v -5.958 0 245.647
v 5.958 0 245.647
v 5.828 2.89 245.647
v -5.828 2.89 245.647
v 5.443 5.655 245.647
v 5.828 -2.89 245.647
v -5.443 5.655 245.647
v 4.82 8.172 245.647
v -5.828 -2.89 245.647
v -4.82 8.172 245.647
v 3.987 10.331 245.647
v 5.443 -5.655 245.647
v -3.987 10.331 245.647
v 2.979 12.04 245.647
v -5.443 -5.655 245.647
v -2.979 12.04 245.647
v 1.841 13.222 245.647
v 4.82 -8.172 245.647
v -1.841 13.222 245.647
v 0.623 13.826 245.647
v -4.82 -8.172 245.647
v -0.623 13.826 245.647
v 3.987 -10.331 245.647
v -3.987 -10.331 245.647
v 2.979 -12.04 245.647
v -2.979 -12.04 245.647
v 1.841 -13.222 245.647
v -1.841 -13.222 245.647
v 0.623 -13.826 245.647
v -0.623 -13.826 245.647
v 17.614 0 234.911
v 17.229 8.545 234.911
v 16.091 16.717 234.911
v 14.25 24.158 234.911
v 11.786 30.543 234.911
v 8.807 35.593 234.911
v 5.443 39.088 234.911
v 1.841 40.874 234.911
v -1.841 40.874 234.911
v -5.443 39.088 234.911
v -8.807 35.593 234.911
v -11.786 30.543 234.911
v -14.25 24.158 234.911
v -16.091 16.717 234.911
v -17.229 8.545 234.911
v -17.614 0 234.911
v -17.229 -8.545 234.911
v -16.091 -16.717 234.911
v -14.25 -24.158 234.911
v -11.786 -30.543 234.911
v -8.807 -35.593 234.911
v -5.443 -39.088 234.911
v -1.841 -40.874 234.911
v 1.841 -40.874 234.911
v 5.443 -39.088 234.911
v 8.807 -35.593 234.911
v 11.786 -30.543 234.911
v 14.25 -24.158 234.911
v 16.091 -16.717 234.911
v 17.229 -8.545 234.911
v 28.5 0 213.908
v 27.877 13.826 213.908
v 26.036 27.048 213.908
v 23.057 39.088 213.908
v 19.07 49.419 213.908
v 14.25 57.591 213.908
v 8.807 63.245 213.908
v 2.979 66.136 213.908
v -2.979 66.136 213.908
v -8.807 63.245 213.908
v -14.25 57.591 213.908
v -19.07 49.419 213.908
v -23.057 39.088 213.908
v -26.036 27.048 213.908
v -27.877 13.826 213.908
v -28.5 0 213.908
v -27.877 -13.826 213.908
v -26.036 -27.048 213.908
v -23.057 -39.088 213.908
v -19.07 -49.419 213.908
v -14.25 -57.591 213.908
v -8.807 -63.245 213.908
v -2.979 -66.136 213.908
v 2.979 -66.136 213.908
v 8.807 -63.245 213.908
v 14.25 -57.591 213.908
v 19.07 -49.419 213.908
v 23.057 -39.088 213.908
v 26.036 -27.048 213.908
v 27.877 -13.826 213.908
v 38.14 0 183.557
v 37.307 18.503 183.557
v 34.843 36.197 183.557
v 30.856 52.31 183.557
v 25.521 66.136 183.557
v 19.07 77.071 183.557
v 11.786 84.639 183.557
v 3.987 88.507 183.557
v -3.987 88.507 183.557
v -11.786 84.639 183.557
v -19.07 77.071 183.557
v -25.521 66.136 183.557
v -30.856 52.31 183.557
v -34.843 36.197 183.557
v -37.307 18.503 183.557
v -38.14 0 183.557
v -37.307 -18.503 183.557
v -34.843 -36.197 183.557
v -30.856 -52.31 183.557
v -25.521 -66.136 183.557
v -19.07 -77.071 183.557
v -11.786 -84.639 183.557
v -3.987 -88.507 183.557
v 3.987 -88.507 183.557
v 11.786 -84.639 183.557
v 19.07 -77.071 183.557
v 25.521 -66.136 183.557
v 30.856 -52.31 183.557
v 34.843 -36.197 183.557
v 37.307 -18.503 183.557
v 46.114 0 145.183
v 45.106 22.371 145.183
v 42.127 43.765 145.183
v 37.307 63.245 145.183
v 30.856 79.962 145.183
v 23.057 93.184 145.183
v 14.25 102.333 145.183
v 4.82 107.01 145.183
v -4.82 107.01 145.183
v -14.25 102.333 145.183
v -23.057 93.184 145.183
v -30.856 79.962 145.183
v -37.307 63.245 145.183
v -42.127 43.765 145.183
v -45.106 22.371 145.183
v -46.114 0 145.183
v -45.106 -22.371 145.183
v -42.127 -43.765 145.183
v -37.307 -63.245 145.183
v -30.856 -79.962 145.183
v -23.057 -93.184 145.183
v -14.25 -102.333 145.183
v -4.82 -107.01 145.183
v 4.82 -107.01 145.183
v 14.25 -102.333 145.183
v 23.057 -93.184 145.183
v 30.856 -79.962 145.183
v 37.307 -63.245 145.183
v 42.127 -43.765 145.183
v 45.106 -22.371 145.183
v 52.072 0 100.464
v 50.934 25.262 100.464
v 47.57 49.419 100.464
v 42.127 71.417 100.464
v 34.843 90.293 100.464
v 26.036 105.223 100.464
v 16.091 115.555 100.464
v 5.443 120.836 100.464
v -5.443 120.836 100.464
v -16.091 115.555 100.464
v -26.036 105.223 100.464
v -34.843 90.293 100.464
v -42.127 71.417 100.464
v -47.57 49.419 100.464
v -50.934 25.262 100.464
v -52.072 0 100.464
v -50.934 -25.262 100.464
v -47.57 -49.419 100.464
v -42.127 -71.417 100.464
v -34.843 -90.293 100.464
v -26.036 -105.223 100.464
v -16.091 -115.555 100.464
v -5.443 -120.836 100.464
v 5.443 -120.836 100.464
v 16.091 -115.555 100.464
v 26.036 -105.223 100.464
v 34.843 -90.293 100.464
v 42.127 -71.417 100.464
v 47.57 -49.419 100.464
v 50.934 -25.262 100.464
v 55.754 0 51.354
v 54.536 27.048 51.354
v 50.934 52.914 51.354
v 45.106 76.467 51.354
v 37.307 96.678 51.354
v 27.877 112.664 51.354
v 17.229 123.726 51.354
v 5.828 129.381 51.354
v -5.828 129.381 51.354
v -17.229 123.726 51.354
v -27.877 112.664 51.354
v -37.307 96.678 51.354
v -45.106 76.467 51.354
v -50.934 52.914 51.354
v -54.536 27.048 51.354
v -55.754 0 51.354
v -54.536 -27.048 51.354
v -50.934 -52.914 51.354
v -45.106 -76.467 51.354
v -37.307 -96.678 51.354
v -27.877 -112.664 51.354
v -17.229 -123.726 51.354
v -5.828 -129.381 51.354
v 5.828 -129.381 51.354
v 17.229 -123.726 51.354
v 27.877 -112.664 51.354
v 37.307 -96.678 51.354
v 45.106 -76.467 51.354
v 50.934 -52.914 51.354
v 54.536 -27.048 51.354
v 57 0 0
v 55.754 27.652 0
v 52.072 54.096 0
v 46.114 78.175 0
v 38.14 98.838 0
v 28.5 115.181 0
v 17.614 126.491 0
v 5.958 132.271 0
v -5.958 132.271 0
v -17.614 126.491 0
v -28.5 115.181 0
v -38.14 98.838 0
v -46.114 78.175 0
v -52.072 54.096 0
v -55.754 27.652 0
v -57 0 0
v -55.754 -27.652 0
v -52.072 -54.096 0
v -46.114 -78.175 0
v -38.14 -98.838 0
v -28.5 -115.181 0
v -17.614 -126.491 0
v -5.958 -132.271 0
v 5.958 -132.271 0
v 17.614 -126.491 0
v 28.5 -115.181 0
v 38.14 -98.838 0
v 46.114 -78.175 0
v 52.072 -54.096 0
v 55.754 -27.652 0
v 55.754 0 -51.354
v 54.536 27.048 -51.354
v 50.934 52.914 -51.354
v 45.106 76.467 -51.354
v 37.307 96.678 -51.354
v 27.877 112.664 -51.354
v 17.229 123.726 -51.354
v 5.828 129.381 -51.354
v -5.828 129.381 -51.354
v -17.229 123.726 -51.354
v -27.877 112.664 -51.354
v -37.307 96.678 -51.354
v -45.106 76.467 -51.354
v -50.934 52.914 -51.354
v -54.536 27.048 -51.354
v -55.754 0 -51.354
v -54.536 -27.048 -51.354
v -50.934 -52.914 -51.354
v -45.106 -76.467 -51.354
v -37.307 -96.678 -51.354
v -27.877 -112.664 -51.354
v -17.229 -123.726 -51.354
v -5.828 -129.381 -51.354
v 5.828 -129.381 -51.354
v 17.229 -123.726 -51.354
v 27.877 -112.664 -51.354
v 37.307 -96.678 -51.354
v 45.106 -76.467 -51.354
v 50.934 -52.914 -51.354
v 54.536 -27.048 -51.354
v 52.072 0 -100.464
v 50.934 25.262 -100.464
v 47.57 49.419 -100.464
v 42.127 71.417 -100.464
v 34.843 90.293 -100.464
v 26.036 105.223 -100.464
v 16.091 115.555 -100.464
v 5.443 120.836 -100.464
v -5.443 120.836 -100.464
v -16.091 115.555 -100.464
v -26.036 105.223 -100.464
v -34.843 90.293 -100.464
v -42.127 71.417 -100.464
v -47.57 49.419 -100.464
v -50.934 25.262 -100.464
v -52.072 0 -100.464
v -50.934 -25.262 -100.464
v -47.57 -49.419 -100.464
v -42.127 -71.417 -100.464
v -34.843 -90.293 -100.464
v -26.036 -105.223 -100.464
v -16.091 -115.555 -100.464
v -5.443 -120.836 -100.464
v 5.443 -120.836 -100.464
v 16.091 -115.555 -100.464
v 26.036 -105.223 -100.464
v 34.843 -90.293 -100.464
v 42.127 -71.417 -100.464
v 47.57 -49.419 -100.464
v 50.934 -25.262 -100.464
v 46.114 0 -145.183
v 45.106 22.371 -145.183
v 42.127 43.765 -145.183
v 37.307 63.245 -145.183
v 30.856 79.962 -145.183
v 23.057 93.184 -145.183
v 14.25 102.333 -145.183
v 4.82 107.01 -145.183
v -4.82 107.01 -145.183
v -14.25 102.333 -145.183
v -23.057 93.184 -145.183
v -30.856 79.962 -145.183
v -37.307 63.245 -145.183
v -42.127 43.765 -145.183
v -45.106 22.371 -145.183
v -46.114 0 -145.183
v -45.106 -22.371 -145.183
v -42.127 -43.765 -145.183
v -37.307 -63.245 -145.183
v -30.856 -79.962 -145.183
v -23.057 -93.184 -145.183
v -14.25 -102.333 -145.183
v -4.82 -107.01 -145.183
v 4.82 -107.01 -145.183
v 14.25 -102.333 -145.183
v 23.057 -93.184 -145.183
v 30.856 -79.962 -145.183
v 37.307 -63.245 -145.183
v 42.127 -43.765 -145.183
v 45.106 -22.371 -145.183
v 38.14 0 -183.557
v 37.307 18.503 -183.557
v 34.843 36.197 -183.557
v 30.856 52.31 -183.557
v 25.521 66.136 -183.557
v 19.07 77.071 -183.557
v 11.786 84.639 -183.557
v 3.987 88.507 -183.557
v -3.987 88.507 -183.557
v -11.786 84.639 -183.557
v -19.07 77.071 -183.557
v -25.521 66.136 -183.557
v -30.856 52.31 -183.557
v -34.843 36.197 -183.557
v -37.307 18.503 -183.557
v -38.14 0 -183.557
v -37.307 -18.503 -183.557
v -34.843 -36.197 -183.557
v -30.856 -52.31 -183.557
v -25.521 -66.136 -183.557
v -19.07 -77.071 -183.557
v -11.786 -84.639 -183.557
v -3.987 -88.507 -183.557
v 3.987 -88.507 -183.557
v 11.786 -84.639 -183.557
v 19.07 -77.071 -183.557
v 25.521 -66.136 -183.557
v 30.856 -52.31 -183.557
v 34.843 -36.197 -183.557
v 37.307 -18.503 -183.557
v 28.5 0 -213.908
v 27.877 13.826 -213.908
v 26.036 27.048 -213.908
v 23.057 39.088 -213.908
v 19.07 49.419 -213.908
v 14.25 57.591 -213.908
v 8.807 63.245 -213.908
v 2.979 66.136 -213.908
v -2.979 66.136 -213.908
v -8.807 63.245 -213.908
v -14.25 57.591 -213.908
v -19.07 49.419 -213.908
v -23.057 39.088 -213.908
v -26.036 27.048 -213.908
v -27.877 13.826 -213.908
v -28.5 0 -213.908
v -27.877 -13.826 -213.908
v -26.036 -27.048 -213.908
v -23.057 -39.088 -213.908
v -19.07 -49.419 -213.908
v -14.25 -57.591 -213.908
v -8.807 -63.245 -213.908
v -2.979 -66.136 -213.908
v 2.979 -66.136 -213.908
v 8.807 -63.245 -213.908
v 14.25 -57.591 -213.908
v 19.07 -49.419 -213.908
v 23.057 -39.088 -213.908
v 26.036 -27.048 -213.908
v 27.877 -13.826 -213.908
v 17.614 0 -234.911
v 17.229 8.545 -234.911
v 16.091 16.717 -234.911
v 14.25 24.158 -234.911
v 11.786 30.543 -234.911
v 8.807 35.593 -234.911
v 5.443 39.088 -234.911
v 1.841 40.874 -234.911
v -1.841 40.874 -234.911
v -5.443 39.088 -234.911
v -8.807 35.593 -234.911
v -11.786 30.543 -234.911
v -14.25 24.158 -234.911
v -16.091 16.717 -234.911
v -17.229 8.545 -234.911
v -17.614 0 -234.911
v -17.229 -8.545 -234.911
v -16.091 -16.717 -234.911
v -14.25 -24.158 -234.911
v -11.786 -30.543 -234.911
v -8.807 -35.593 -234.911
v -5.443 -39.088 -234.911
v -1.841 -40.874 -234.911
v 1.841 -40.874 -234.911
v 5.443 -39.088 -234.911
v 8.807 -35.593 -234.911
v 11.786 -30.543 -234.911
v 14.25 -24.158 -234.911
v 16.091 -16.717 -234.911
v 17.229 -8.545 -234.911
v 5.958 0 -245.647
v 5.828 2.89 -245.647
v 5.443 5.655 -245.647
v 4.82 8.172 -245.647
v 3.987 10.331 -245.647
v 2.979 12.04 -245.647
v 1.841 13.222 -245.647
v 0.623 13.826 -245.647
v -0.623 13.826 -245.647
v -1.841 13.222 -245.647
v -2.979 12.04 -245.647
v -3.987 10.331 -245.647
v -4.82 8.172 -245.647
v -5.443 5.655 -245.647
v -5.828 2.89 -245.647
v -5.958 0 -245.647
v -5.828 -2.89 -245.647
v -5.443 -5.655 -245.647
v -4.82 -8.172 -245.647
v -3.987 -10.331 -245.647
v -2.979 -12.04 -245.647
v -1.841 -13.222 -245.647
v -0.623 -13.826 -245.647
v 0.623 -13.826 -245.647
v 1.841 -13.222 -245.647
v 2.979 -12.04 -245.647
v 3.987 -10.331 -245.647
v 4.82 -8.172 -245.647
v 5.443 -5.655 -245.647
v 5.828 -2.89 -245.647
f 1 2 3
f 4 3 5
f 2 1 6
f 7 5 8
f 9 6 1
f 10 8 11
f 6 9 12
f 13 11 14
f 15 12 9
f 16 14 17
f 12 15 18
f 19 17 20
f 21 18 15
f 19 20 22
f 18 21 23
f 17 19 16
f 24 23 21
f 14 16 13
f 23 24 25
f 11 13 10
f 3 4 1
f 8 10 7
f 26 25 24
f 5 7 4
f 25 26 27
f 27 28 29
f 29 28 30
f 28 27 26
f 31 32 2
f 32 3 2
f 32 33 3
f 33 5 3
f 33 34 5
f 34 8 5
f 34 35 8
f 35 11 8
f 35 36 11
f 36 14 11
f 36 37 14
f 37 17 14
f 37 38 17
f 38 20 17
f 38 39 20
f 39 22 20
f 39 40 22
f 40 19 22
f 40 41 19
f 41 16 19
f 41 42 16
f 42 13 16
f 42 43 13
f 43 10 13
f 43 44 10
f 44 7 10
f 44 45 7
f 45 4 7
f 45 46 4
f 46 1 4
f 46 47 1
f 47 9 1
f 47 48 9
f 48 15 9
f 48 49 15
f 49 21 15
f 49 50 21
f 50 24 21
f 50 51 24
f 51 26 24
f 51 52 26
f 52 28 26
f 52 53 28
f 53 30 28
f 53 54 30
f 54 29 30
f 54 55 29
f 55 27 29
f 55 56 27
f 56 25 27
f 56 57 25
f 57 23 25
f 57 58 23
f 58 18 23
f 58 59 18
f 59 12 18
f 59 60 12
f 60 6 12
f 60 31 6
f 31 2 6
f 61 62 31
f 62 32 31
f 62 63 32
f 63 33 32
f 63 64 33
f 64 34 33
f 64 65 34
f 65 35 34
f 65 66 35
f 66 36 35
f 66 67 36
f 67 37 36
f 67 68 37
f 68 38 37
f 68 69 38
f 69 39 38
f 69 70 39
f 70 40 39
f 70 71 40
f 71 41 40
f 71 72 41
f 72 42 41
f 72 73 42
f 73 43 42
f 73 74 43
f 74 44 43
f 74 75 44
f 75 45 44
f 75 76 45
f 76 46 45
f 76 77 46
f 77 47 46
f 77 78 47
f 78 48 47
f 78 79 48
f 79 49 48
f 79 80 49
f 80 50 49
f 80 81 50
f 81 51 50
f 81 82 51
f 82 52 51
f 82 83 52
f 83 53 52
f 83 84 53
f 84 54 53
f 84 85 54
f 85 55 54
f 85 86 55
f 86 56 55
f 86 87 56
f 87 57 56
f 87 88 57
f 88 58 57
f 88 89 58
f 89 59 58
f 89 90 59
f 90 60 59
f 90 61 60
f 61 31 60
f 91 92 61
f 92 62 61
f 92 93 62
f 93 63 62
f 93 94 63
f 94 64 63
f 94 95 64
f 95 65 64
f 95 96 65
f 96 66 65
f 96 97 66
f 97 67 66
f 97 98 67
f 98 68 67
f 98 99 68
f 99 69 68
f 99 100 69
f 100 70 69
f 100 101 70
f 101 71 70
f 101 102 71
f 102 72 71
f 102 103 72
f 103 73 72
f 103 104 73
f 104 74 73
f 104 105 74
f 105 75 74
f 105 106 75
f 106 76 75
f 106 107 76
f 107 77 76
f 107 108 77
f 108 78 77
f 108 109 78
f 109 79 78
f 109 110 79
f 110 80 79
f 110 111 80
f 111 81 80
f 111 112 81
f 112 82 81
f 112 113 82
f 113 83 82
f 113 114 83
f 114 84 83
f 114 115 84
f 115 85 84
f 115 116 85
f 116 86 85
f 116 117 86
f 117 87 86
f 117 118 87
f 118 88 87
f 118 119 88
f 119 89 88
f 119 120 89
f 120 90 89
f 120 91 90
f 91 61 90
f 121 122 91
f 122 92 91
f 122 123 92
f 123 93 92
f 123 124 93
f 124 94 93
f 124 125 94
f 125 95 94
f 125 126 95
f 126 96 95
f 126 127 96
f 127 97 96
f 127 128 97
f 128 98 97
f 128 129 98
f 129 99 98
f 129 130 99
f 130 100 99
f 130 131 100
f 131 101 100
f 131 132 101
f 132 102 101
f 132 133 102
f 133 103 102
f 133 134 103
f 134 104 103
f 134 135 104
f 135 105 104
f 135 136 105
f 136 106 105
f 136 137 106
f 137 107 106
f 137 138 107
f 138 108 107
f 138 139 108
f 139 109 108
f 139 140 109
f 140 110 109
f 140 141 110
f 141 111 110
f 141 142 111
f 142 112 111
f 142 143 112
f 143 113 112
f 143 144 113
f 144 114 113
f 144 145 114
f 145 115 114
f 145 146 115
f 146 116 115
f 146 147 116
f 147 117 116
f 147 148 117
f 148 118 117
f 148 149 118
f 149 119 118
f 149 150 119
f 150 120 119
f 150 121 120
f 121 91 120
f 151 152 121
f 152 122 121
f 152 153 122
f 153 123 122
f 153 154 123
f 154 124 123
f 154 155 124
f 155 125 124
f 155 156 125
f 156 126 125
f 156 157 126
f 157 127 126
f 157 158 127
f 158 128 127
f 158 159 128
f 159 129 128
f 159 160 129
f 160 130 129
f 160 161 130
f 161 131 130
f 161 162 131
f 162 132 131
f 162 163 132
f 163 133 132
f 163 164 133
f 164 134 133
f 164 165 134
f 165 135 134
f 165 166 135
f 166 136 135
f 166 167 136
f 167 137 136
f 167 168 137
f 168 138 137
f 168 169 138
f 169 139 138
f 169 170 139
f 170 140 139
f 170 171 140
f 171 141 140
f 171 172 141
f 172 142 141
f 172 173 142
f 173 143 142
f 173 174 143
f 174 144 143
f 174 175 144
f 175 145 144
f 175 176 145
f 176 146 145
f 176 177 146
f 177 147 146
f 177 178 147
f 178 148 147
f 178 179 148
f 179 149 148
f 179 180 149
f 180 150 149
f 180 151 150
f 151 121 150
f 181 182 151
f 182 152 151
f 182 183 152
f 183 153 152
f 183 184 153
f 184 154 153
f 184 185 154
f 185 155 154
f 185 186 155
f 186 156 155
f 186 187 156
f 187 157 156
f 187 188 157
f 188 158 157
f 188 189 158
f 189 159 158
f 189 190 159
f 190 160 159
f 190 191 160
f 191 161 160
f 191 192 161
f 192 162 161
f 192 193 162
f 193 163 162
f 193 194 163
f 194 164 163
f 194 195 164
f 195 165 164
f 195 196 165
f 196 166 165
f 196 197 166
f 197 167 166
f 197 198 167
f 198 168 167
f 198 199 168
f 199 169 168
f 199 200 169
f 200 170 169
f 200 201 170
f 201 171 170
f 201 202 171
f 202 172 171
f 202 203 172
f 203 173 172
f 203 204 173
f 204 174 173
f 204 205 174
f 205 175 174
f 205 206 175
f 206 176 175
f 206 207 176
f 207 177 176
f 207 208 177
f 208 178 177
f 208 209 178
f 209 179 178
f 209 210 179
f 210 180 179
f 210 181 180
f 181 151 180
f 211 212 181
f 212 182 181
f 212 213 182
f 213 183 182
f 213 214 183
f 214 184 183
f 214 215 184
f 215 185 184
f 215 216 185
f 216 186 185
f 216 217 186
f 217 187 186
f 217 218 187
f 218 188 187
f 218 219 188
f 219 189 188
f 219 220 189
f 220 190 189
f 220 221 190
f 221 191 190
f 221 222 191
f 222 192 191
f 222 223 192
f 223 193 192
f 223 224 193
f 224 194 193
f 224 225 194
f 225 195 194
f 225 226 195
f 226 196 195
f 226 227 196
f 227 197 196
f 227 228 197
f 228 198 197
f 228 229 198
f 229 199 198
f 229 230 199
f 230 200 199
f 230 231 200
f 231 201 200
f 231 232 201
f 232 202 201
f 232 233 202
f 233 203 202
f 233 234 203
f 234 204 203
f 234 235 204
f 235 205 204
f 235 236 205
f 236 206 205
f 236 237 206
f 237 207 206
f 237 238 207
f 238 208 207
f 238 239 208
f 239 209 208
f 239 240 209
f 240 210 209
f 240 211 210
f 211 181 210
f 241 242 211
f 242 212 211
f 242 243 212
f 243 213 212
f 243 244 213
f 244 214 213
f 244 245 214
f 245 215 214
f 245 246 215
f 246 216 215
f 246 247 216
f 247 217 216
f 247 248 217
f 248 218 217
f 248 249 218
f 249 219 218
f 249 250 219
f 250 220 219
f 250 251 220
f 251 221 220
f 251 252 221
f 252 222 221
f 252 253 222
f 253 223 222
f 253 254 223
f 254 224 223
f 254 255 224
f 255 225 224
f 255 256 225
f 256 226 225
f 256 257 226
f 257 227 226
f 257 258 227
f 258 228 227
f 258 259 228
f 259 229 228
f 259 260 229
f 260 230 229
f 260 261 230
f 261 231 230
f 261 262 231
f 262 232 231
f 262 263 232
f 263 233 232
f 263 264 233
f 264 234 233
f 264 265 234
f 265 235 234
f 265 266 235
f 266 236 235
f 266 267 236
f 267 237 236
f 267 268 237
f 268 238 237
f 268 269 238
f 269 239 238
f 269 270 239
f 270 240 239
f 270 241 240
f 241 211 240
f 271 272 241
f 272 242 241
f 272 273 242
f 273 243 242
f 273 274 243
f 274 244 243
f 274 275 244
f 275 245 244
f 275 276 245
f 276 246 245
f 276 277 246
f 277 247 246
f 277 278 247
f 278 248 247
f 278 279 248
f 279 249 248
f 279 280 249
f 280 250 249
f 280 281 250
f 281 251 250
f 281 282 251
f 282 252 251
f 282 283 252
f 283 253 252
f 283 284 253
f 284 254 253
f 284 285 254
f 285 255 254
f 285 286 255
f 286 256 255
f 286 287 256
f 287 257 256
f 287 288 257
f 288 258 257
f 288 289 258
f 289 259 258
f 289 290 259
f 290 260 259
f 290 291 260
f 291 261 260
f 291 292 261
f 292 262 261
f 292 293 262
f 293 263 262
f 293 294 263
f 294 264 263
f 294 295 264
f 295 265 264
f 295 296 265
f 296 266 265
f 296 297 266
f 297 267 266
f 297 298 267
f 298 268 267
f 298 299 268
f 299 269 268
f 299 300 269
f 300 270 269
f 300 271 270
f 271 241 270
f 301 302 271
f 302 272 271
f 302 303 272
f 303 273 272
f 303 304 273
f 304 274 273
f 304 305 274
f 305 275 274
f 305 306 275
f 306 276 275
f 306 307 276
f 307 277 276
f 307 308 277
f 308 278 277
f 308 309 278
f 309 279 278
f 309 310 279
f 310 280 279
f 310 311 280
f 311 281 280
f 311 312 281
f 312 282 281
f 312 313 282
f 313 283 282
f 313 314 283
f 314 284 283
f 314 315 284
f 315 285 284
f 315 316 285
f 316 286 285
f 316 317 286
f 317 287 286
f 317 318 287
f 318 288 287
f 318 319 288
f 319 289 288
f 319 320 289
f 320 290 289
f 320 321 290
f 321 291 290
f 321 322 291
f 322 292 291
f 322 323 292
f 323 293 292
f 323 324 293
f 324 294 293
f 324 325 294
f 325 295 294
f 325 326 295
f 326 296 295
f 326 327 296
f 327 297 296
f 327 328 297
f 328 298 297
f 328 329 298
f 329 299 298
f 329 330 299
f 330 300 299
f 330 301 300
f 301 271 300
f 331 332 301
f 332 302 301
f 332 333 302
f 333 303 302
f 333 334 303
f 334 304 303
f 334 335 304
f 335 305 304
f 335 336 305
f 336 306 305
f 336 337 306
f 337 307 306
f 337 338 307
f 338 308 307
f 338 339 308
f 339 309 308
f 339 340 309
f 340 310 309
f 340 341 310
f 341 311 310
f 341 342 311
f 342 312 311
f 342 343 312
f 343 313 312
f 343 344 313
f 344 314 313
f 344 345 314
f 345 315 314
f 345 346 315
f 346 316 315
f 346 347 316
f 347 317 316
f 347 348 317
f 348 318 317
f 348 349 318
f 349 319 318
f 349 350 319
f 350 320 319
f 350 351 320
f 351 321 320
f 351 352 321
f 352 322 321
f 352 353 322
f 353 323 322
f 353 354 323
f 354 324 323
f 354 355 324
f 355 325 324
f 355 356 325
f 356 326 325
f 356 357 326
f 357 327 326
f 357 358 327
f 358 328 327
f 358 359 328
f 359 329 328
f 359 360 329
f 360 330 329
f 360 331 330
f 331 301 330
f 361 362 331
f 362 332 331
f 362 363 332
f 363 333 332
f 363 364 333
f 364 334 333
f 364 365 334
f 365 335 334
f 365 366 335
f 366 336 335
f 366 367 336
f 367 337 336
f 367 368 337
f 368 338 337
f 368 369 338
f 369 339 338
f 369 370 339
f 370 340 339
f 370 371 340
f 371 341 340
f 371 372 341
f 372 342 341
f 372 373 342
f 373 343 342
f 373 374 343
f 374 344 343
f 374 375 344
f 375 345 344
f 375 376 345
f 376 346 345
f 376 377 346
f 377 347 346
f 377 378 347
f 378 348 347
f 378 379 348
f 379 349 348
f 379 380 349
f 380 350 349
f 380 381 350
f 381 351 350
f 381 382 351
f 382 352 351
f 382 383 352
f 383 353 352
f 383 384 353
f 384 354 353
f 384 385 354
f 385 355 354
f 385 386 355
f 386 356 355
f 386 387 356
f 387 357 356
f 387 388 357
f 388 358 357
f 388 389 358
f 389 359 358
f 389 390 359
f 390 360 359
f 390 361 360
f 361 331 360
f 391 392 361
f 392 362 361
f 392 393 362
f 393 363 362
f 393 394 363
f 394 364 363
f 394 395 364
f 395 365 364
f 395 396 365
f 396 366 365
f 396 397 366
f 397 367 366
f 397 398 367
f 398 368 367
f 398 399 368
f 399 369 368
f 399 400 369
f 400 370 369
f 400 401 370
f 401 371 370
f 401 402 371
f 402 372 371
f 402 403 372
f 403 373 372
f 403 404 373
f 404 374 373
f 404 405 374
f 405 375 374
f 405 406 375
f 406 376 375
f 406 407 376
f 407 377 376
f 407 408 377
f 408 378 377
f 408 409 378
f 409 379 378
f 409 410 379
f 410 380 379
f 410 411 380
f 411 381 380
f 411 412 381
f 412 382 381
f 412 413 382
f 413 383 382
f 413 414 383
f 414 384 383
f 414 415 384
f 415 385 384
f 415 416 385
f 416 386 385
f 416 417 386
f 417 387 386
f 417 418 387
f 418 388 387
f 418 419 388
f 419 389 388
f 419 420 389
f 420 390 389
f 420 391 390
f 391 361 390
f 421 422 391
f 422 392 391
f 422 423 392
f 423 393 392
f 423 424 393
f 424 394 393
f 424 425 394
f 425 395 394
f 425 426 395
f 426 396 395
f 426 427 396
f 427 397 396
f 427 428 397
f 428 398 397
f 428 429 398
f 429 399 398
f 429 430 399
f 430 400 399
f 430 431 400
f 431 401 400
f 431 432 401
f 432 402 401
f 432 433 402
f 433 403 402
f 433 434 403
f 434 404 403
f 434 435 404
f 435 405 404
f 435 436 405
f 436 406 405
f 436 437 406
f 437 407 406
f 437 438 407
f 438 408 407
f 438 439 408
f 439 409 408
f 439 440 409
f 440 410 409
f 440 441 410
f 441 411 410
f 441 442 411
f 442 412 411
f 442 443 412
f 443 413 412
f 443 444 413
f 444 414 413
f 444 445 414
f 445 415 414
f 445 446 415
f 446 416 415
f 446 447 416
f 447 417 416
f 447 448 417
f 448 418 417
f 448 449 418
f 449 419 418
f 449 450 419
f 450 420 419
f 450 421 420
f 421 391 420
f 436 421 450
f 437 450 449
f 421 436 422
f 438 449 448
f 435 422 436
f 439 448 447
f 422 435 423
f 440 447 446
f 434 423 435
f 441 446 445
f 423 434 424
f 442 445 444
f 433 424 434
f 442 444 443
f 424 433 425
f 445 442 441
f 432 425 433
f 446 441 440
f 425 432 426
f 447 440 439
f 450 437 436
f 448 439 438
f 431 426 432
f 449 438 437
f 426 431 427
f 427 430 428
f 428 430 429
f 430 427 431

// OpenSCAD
// Generated by SolidPython 1.0.1 on 2020-07-29 00:46:45


scale(v = [3, 7, 13]) {
	sphere(r = 19);
}
/***********************************************
*********      SolidPython code:      **********
************************************************
 
# import packages: SolidPython
from solid import *
from solid.utils import *
from itertools import chain, combinations, permutations


class Resize:

    def __init__(self, scad_file):
        self.scad_file = scad_file
        #self.scad_file = import_scad(scad_file)
        # cone/cylinder param:
        self.r1 = 0
        self.r2 = 0
        self.h = 0
        # rectangular prism param:
        self.w = 0
        self.l = 0
        # ellipse param:
        self.r = 0

    # import OpenScad code (file name corresponds to shape)


    # classify shape + parameters
    def assign(self, param1, param2, param3):
        if self.scad_file == 'cone.scad':
            self.r1 = param1
            self.r2 = param2
            self.h = param3
        elif self.scad_file == 'cylinder.scad':
            self.r1 = param1
            self.r2 = param2
            self.h = param3
        elif self.scad_file == 'rectangularPrism.scad':
            self.h = param1
            self.l = param2
            self.w = param3
        else:
            self.r = param1
            self.h = param2

    # resize parameters
    def iterate(self):
        x = range(3, 20, 2)
        i = 1
        if self.scad_file == 'cone.scad':
            tempList = list(permutations(x, 2))
            for temp in tempList:
                param1 = temp[0]
                param2 = temp[1]
                filepath = 'produced_scad_files/' + 'cone' + str(param1) + '_' + str(param2) + '_' + '.scad'
                scad_render_to_file(cylinder(h=param1, r1=param2, r2=0), filepath)

        elif self.scad_file == 'cylinder.scad':
            tempList = list(permutations(x, 3))
            for temp in tempList:
                param1 = temp[0]
                param2 = temp[1]
                filepath = 'produced_scad_files/' + 'cylinder' + str(param1) + '_' + str(param2) + '_' + '.scad'
                scad_render_to_file(cylinder(h=param1, r1=param2, r2=param2), filepath)

        elif self.scad_file == 'rectangularPrism.scad':
            tempList = list(permutations(x, 3))
            for temp in tempList:
                param1 = temp[0]
                param2 = temp[1]
                param3 = temp[2]
                filepath = 'produced_scad_files/' + 'rectangularPrism' + str(param1) + '_' + str(param2) + '_' + str(
                    param3) + '.scad'
                scad_render_to_file(cube(size=(param1, param2, param3)), filepath)

        elif self.scad_file == 'ellipse.scad':
            tempList = list(permutations(x, 4))
            for temp in tempList:
                param1 = temp[0]
                param2 = temp[1]
                param3 = temp[2]
                param4 = temp[3]
                filepath = 'produced_scad_files/' + 'ellipse' + str(param1) + '_' + str(param2) + '_' + str(param3) + '_' + str(param4) + '.scad'
                scad_render_to_file(scale([param1, param2, param3])(sphere(r=param4)), filepath)

    def render_to_scadfile(self):
        scad_render_to_file(scad, 'example.scad') 
 
************************************************/
